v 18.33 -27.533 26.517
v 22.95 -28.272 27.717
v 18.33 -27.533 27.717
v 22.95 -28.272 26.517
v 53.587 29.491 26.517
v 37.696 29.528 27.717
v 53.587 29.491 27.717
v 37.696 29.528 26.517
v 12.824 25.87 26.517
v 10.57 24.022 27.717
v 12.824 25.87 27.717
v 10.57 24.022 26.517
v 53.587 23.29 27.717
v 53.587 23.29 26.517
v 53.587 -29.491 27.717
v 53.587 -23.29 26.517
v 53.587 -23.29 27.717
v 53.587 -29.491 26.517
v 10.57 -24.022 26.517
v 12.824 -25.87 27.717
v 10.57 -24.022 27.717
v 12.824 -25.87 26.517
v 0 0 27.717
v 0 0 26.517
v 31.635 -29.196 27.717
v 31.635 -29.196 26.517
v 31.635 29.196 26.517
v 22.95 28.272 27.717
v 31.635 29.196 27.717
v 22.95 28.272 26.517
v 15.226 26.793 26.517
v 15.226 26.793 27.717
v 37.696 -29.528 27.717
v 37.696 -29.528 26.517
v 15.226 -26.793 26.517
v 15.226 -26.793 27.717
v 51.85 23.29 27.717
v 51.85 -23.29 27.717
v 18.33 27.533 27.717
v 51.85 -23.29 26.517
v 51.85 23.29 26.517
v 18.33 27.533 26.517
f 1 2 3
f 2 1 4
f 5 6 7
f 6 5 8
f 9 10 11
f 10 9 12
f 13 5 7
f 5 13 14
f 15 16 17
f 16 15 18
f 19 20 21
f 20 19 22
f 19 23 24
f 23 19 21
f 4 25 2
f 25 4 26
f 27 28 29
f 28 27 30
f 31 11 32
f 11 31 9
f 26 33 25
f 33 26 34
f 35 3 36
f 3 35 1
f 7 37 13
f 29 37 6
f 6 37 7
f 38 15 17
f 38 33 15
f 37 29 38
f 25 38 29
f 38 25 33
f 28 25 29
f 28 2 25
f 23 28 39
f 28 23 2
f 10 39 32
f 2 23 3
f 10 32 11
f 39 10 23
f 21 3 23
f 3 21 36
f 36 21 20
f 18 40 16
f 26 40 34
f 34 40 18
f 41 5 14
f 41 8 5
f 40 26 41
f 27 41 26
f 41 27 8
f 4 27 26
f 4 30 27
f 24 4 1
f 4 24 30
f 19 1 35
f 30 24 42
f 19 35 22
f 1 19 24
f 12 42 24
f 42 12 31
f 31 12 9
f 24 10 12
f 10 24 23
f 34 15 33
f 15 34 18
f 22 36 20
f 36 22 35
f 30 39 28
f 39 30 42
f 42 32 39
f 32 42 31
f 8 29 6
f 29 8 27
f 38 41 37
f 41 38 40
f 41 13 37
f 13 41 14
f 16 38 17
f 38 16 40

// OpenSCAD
// Sarepta hull study, 170 mm overall. Units in the station table are full-size mm.
// See README.md for source provenance and reconstruction limitations.
length_mm = 170;
wall_mm = 1.2;
transom_mm = 2.0;
deck_mm = 1.2;
part = "hull"; // [hull, outer, inner, sections]
station_steps = 12;

scale_factor = length_mm / 4600;
// x runs from bow to stern; y is transverse; z is above the keel baseline.
// Rows: x, then [y,z] for keel, three bottom samples, tunnel crown,
// outer chine, sheer, and deck centre. Stations 1..5 follow the 1974 body plan.
// Longitudinal positions, stem closure and sheer fairing are reconstructed.
// A separate continuous planar foredeck covers the three underlying bows.
stations = [
 [0, [[0,750],[96,750],[192,750],[288,750],[384,750],[625,750],[702,750],[0,750]]],
 [460, [[0,220],[96,325],[192,433],[288,560],[384,687],[625,506],[702,735],[0,790]]],
 [920, [[0,33],[108,92],[216,169],[324,271],[432,383],[640,270],[790,750],[0,802]]],
 [1380,[[0,0],[110,35],[219,76],[329,135],[438,211],[640,136],[800,750],[0,794]]],
 [1840,[[0,0],[110,28],[219,61],[329,99],[438,142],[640,105],[800,750],[0,780]]],
 [2300,[[0,0],[110,27],[219,53],[329,80],[438,105],[650,100],[800,750],[0,770]]],
 [3067,[[0,0],[110,16.4],[219,32.7],[329,49.2],[438,65.5],[650,97.2],[800,750],[0,765]]],
 [4200,[[0,0],[110,16.4],[219,32.7],[329,49.2],[438,65.5],[650,97.2],[800,750],[0,765]]],
 [4600,[[0,0],[110,16.4],[219,32.7],[329,49.2],[438,65.5],[650,97.2],[790,750],[0,765]]]
];

function d(i,j,k) = (stations[i+1][1][j][k]-stations[i][1][j][k]) /
                         (stations[i+1][0]-stations[i][0]);
function tangent(i,j,k) =
 i==0 ? d(0,j,k) : i==len(stations)-1 ? d(i-1,j,k) :
 let(a=d(i-1,j,k), b=d(i,j,k)) a*b<=0 ? 0 :
 sign(a)*min(abs((a+b)/2),2*abs(a),2*abs(b));
function blend(i,t,j,k) = let(h=stations[i+1][0]-stations[i][0])
 (2*t*t*t-3*t*t+1)*stations[i][1][j][k] +
 (t*t*t-2*t*t+t)*h*tangent(i,j,k) +
 (-2*t*t*t+3*t*t)*stations[i+1][1][j][k] +
 (t*t*t-t*t)*h*tangent(i+1,j,k);
function half_section(i,t) = [for(j=[0:7])
 [blend(i,t,j,0)*scale_factor,blend(i,t,j,1)*scale_factor]];
function outer_ring(p) = concat(
 [for(j=[6:-1:1]) [-p[j][0],p[j][1]]],
 [for(j=[0:7]) p[j]]);
function cross2(a,b) = a[0]*b[1]-a[1]*b[0];
function normal(v) = [-v[1],v[0]]/norm(v);
// Mitered inward offset of the open bottom/side polyline in the YZ plane.
function inset(p,j,w) =
 j==0 ? p[j]+w*normal(p[1]-p[0]) :
 j==len(p)-1 ? p[j]+w*normal(p[j]-p[j-1]) :
 let(a=p[j]-p[j-1],b=p[j+1]-p[j],na=normal(a),nb=normal(b),
     den=cross2(a,b))
 abs(den)<0.000001 ? p[j]+w*na :
 p[j]+w*na+a*(cross2(w*(nb-na),b)/den);
function inner_ring(p) = let(bottom=concat(
 [for(j=[6:-1:1]) [-p[j][0],p[j][1]]],
 [for(j=[0:6]) p[j]]), q=[for(j=[0:len(bottom)-1]) inset(bottom,j,wall_mm)])
 concat(q,[[q[len(q)-1][0],60],[q[0][0],60]]);

// Convex quintic Bezier guide curves: centre stem, tunnel crown, outboard stem.
// All three have horizontal first and second derivatives at the aft endpoint.
// Full-size reconstruction coordinates, fitted approximately to the body plan.
guide_controls = [
    [[0.0, 750.0], [0.0, 498.735739], [298.958581, 241.850206], [818.67287, 0.0], [930.073765, 0.0], [1380.0, 0.0]],
    [[464.0, 750.0], [464.0, 744.834548], [1073.113065, 200.924939], [1373.660044, 65.5], [2754.543723, 65.5], [3067.0, 65.5]],
    [[295.0, 750.0], [295.0, 638.784365], [886.016721, 290.176633], [1217.401932, 97.2], [1485.812619, 97.2], [2300.0, 97.2]]
];
function bezier5(p,t) = pow(1-t,5)*p[0]+5*pow(1-t,4)*t*p[1]+
    10*pow(1-t,3)*t*t*p[2]+10*pow(1-t,2)*pow(t,3)*p[3]+
    5*(1-t)*pow(t,4)*p[4]+pow(t,5)*p[5];
function curve_parameter(p,x,lo=0,hi=1,n=0) = x<=p[0][0] ? 0 : x>=p[5][0] ? 1 :
    n==34 ? (lo+hi)/2 :
    let(t=(lo+hi)/2) bezier5(p,t)[0]<x ? curve_parameter(p,x,t,hi,n+1) :
    curve_parameter(p,x,lo,t,n+1);
function smooth5(t) = let(u=max(0,min(1,t))) u*u*u*(10-15*u+6*u*u);
function guide_point(k,r) = let(p=guide_controls[k],start=p[0][0],end=p[5][0],
    x=r<end ? start+(end-start)*r/end : r,
    z=r<end ? bezier5(p,curve_parameter(p,x))[1] : p[5][1],
    y=k==0?0 : k==1?384+54*smooth5(r/1380) : 625+25*smooth5(r/2300))
    [x,y,z];
function sheer_point(r) = [r<1380 ? 412+(1380-412)*r/1380 : r,
    r<1380 ? 702+98*smooth5(r/1380) : r<4200 ? 800 :
    800-10*smooth5((r-4200)/400),750];
function half_surface(r,k,g) = let(c=g[0],t=g[1],b=g[2],s=g[3])
    k<=16 ? let(u=k/16,v=u*(1-0.14*(1-smooth5(r/2300))*(1-u)),p=c+(t-c)*v)
        [p[0],c[1]+(t[1]-c[1])*u,p[2]] :
    k<=20 ? t+(b-t)*(k-16)/4 : b+(s-b)*(k-20)/4;
function fair_bottom(r,j,g) = let(k=abs(j-24),p=half_surface(r,k,g))
    [p[0]*scale_factor,(j<24?-p[1]:p[1])*scale_factor,p[2]*scale_factor];

// Share the final exterior grid with the cavity so plan edits cannot expose it.
fair_rows=concat([for(i=[0:180]) 3067*i/180],
    [for(i=[1:36]) 3067+(4600-3067)*i/36]);
fair_guides=[for(r=fair_rows) [guide_point(0,r),guide_point(1,r),guide_point(2,r),sheer_point(r)]];
fair_points=[for(i=[0:len(fair_rows)-1],j=[0:48])
    fair_bottom(fair_rows[i],j,fair_guides[i])];

rings = concat([for(i=[0:len(stations)-2]) let(steps=i==0?48:station_steps)
    for(s=[0:steps-1])
 [ (stations[i][0]+(stations[i+1][0]-stations[i][0])*s/steps)*scale_factor,
   half_section(i,s/steps)]],
 [[length_mm,[for(p=stations[len(stations)-1][1]) p*scale_factor]]]);

// The bottom surface retains its three bow edges. A separate planar sheet
// closes their upper gaps and creates the continuous deck outline.
function top_index(i,j,m,n) = (i==0 || j==0 || j==n-1) ? i*n+j :
    m*n+(i-1)*(n-2)+j-1;
module loft(inner=false) {
    rr = inner ? [for(r=rings) if(r[0]>=length_mm*0.15) [r[0],inner_ring(r[1])]] :
                 [for(r=rings) [r[0],outer_ring(r[1])]];
    m=len(rr);
    if(inner) {
        cavity=[for(i=[0:len(fair_rows)-1]) if(fair_rows[i]>=690)
            let(b=[for(j=[0:48]) fair_points[i*49+j]],
                yz=[for(p=b) [p[1],p[2]]],
                q=[for(j=[0:48]) inset(yz,j,wall_mm)])
            concat([for(j=[0:48]) [b[j][0],q[j][0],q[j][1]]],
                   [[b[48][0],q[48][0],60],[b[0][0],q[0][0],60]])];
        n=len(cavity[0]);m=len(cavity);
        pp=[for(row=cavity,p=row) p];
        ff=concat([[for(j=[n-1:-1:0]) j]],
            [for(i=[0:m-2],j=[0:n-1]) each
             [[i*n+j,i*n+(j+1)%n,(i+1)*n+(j+1)%n],
              [i*n+j,(i+1)*n+(j+1)%n,(i+1)*n+j]]],
            [[for(j=[0:n-1]) (m-1)*n+j]]);
        polyhedron(points=pp,faces=[for(f=ff) [for(j=[len(f)-1:-1:0]) f[j]]],convexity=12);
    } else {
        n=49;
        outer_rows=fair_rows;
        m=len(outer_rows);
        bottom=fair_points;
        top=[for(i=[1:m-1],j=[1:n-2]) let(p=bottom[i*n+j])
            [p[0],p[1],750*scale_factor]];
        ff=concat(
            [for(i=[0:m-2],j=[0:n-2]) each
                [[i*n+j,i*n+j+1,(i+1)*n+j+1],
                 [i*n+j,(i+1)*n+j+1,(i+1)*n+j]]],
            [for(i=[0:m-2],j=[0:n-2]) let(
                a=top_index(i,j,m,n),b=top_index(i,j+1,m,n),
                c=top_index(i+1,j,m,n),d=top_index(i+1,j+1,m,n)) each
                [[a,c,d],[a,d,b]]],
            [concat([for(j=[0:n-1]) (m-1)*n+j],
                    [for(j=[n-2:-1:1]) top_index(m-1,j,m,n)])]);
        polyhedron(points=concat(bottom,top),
            faces=[for(f=ff) [for(j=[len(f)-1:-1:0]) f[j]]],convexity=12);
    }
}

// Photo-matched plan rake: approximately 24 degrees per front edge, giving
// a 132-degree included angle. The tunnels remain below this planar sheet.
function deck_outline() = let(half=[
    [0,0],[79.2,180],[162.8,370],[233.2,530],[286,650],[347,700],
    [412,725],[496,745],[621,765],[856,790],[1020,799],[1450,798]])
    concat([for(p=half) p*scale_factor],
        [for(i=[len(half)-1:-1:1]) [half[i][0]*scale_factor,-half[i][1]*scale_factor]]);
module foredeck_sheet() {
    translate([0,0,750*scale_factor-deck_mm])
        linear_extrude(height=deck_mm) polygon(deck_outline());
}
module exterior() { union() { loft(); foredeck_sheet(); } }

// The cavity follows the same guide grid as the exterior after each plan edit.
module safe_inner() { loft(true); }

module hull() {
    difference() {
        exterior();
        // Leave a 6 mm side deck, a closed foredeck, and an aft well bulkhead.
        intersection() {
            safe_inner();
            union() {
                intersection() {
                    translate([0,0,-deck_mm]) exterior();
                    translate([length_mm*0.15,-40,-1])
                        cube([length_mm*0.71,80,62]);
                }
                translate([length_mm*0.305,-length_mm*0.137,-1])
                    cube([length_mm*0.555,length_mm*0.274,62]);
            }
        }
        // Original-style motor well: low central transom, high aft quarters.
        // The well floor is sealed, with a full-height forward bulkhead.
        translate([length_mm*0.86+wall_mm,-length_mm*0.122,8.0*length_mm/170])
            cube([length_mm*0.14-transom_mm-wall_mm,length_mm*0.244,55]);
        translate([length_mm-transom_mm-0.01,-length_mm*0.122,400*scale_factor])
            cube([transom_mm+0.1,length_mm*0.244,55]);
    }
}

assert(length_mm>=80 && length_mm<=180,"Expected an 80..180 mm model.");
assert(wall_mm>=0.8 && wall_mm<=2,"Wall thickness outside the studied range.");
if(part=="hull") color([0.72,0.77,0.79]) hull();
else if(part=="outer") exterior();
else if(part=="inner") safe_inner();
else if(part=="sections")
    for(i=[1:len(stations)-1])
        translate([stations[i][0]*scale_factor,0,0])
            rotate([90,0,90]) linear_extrude(height=0.25)
                polygon(outer_ring([for(p=stations[i][1]) p*scale_factor]));
else assert(false,"Unknown part selector.");
